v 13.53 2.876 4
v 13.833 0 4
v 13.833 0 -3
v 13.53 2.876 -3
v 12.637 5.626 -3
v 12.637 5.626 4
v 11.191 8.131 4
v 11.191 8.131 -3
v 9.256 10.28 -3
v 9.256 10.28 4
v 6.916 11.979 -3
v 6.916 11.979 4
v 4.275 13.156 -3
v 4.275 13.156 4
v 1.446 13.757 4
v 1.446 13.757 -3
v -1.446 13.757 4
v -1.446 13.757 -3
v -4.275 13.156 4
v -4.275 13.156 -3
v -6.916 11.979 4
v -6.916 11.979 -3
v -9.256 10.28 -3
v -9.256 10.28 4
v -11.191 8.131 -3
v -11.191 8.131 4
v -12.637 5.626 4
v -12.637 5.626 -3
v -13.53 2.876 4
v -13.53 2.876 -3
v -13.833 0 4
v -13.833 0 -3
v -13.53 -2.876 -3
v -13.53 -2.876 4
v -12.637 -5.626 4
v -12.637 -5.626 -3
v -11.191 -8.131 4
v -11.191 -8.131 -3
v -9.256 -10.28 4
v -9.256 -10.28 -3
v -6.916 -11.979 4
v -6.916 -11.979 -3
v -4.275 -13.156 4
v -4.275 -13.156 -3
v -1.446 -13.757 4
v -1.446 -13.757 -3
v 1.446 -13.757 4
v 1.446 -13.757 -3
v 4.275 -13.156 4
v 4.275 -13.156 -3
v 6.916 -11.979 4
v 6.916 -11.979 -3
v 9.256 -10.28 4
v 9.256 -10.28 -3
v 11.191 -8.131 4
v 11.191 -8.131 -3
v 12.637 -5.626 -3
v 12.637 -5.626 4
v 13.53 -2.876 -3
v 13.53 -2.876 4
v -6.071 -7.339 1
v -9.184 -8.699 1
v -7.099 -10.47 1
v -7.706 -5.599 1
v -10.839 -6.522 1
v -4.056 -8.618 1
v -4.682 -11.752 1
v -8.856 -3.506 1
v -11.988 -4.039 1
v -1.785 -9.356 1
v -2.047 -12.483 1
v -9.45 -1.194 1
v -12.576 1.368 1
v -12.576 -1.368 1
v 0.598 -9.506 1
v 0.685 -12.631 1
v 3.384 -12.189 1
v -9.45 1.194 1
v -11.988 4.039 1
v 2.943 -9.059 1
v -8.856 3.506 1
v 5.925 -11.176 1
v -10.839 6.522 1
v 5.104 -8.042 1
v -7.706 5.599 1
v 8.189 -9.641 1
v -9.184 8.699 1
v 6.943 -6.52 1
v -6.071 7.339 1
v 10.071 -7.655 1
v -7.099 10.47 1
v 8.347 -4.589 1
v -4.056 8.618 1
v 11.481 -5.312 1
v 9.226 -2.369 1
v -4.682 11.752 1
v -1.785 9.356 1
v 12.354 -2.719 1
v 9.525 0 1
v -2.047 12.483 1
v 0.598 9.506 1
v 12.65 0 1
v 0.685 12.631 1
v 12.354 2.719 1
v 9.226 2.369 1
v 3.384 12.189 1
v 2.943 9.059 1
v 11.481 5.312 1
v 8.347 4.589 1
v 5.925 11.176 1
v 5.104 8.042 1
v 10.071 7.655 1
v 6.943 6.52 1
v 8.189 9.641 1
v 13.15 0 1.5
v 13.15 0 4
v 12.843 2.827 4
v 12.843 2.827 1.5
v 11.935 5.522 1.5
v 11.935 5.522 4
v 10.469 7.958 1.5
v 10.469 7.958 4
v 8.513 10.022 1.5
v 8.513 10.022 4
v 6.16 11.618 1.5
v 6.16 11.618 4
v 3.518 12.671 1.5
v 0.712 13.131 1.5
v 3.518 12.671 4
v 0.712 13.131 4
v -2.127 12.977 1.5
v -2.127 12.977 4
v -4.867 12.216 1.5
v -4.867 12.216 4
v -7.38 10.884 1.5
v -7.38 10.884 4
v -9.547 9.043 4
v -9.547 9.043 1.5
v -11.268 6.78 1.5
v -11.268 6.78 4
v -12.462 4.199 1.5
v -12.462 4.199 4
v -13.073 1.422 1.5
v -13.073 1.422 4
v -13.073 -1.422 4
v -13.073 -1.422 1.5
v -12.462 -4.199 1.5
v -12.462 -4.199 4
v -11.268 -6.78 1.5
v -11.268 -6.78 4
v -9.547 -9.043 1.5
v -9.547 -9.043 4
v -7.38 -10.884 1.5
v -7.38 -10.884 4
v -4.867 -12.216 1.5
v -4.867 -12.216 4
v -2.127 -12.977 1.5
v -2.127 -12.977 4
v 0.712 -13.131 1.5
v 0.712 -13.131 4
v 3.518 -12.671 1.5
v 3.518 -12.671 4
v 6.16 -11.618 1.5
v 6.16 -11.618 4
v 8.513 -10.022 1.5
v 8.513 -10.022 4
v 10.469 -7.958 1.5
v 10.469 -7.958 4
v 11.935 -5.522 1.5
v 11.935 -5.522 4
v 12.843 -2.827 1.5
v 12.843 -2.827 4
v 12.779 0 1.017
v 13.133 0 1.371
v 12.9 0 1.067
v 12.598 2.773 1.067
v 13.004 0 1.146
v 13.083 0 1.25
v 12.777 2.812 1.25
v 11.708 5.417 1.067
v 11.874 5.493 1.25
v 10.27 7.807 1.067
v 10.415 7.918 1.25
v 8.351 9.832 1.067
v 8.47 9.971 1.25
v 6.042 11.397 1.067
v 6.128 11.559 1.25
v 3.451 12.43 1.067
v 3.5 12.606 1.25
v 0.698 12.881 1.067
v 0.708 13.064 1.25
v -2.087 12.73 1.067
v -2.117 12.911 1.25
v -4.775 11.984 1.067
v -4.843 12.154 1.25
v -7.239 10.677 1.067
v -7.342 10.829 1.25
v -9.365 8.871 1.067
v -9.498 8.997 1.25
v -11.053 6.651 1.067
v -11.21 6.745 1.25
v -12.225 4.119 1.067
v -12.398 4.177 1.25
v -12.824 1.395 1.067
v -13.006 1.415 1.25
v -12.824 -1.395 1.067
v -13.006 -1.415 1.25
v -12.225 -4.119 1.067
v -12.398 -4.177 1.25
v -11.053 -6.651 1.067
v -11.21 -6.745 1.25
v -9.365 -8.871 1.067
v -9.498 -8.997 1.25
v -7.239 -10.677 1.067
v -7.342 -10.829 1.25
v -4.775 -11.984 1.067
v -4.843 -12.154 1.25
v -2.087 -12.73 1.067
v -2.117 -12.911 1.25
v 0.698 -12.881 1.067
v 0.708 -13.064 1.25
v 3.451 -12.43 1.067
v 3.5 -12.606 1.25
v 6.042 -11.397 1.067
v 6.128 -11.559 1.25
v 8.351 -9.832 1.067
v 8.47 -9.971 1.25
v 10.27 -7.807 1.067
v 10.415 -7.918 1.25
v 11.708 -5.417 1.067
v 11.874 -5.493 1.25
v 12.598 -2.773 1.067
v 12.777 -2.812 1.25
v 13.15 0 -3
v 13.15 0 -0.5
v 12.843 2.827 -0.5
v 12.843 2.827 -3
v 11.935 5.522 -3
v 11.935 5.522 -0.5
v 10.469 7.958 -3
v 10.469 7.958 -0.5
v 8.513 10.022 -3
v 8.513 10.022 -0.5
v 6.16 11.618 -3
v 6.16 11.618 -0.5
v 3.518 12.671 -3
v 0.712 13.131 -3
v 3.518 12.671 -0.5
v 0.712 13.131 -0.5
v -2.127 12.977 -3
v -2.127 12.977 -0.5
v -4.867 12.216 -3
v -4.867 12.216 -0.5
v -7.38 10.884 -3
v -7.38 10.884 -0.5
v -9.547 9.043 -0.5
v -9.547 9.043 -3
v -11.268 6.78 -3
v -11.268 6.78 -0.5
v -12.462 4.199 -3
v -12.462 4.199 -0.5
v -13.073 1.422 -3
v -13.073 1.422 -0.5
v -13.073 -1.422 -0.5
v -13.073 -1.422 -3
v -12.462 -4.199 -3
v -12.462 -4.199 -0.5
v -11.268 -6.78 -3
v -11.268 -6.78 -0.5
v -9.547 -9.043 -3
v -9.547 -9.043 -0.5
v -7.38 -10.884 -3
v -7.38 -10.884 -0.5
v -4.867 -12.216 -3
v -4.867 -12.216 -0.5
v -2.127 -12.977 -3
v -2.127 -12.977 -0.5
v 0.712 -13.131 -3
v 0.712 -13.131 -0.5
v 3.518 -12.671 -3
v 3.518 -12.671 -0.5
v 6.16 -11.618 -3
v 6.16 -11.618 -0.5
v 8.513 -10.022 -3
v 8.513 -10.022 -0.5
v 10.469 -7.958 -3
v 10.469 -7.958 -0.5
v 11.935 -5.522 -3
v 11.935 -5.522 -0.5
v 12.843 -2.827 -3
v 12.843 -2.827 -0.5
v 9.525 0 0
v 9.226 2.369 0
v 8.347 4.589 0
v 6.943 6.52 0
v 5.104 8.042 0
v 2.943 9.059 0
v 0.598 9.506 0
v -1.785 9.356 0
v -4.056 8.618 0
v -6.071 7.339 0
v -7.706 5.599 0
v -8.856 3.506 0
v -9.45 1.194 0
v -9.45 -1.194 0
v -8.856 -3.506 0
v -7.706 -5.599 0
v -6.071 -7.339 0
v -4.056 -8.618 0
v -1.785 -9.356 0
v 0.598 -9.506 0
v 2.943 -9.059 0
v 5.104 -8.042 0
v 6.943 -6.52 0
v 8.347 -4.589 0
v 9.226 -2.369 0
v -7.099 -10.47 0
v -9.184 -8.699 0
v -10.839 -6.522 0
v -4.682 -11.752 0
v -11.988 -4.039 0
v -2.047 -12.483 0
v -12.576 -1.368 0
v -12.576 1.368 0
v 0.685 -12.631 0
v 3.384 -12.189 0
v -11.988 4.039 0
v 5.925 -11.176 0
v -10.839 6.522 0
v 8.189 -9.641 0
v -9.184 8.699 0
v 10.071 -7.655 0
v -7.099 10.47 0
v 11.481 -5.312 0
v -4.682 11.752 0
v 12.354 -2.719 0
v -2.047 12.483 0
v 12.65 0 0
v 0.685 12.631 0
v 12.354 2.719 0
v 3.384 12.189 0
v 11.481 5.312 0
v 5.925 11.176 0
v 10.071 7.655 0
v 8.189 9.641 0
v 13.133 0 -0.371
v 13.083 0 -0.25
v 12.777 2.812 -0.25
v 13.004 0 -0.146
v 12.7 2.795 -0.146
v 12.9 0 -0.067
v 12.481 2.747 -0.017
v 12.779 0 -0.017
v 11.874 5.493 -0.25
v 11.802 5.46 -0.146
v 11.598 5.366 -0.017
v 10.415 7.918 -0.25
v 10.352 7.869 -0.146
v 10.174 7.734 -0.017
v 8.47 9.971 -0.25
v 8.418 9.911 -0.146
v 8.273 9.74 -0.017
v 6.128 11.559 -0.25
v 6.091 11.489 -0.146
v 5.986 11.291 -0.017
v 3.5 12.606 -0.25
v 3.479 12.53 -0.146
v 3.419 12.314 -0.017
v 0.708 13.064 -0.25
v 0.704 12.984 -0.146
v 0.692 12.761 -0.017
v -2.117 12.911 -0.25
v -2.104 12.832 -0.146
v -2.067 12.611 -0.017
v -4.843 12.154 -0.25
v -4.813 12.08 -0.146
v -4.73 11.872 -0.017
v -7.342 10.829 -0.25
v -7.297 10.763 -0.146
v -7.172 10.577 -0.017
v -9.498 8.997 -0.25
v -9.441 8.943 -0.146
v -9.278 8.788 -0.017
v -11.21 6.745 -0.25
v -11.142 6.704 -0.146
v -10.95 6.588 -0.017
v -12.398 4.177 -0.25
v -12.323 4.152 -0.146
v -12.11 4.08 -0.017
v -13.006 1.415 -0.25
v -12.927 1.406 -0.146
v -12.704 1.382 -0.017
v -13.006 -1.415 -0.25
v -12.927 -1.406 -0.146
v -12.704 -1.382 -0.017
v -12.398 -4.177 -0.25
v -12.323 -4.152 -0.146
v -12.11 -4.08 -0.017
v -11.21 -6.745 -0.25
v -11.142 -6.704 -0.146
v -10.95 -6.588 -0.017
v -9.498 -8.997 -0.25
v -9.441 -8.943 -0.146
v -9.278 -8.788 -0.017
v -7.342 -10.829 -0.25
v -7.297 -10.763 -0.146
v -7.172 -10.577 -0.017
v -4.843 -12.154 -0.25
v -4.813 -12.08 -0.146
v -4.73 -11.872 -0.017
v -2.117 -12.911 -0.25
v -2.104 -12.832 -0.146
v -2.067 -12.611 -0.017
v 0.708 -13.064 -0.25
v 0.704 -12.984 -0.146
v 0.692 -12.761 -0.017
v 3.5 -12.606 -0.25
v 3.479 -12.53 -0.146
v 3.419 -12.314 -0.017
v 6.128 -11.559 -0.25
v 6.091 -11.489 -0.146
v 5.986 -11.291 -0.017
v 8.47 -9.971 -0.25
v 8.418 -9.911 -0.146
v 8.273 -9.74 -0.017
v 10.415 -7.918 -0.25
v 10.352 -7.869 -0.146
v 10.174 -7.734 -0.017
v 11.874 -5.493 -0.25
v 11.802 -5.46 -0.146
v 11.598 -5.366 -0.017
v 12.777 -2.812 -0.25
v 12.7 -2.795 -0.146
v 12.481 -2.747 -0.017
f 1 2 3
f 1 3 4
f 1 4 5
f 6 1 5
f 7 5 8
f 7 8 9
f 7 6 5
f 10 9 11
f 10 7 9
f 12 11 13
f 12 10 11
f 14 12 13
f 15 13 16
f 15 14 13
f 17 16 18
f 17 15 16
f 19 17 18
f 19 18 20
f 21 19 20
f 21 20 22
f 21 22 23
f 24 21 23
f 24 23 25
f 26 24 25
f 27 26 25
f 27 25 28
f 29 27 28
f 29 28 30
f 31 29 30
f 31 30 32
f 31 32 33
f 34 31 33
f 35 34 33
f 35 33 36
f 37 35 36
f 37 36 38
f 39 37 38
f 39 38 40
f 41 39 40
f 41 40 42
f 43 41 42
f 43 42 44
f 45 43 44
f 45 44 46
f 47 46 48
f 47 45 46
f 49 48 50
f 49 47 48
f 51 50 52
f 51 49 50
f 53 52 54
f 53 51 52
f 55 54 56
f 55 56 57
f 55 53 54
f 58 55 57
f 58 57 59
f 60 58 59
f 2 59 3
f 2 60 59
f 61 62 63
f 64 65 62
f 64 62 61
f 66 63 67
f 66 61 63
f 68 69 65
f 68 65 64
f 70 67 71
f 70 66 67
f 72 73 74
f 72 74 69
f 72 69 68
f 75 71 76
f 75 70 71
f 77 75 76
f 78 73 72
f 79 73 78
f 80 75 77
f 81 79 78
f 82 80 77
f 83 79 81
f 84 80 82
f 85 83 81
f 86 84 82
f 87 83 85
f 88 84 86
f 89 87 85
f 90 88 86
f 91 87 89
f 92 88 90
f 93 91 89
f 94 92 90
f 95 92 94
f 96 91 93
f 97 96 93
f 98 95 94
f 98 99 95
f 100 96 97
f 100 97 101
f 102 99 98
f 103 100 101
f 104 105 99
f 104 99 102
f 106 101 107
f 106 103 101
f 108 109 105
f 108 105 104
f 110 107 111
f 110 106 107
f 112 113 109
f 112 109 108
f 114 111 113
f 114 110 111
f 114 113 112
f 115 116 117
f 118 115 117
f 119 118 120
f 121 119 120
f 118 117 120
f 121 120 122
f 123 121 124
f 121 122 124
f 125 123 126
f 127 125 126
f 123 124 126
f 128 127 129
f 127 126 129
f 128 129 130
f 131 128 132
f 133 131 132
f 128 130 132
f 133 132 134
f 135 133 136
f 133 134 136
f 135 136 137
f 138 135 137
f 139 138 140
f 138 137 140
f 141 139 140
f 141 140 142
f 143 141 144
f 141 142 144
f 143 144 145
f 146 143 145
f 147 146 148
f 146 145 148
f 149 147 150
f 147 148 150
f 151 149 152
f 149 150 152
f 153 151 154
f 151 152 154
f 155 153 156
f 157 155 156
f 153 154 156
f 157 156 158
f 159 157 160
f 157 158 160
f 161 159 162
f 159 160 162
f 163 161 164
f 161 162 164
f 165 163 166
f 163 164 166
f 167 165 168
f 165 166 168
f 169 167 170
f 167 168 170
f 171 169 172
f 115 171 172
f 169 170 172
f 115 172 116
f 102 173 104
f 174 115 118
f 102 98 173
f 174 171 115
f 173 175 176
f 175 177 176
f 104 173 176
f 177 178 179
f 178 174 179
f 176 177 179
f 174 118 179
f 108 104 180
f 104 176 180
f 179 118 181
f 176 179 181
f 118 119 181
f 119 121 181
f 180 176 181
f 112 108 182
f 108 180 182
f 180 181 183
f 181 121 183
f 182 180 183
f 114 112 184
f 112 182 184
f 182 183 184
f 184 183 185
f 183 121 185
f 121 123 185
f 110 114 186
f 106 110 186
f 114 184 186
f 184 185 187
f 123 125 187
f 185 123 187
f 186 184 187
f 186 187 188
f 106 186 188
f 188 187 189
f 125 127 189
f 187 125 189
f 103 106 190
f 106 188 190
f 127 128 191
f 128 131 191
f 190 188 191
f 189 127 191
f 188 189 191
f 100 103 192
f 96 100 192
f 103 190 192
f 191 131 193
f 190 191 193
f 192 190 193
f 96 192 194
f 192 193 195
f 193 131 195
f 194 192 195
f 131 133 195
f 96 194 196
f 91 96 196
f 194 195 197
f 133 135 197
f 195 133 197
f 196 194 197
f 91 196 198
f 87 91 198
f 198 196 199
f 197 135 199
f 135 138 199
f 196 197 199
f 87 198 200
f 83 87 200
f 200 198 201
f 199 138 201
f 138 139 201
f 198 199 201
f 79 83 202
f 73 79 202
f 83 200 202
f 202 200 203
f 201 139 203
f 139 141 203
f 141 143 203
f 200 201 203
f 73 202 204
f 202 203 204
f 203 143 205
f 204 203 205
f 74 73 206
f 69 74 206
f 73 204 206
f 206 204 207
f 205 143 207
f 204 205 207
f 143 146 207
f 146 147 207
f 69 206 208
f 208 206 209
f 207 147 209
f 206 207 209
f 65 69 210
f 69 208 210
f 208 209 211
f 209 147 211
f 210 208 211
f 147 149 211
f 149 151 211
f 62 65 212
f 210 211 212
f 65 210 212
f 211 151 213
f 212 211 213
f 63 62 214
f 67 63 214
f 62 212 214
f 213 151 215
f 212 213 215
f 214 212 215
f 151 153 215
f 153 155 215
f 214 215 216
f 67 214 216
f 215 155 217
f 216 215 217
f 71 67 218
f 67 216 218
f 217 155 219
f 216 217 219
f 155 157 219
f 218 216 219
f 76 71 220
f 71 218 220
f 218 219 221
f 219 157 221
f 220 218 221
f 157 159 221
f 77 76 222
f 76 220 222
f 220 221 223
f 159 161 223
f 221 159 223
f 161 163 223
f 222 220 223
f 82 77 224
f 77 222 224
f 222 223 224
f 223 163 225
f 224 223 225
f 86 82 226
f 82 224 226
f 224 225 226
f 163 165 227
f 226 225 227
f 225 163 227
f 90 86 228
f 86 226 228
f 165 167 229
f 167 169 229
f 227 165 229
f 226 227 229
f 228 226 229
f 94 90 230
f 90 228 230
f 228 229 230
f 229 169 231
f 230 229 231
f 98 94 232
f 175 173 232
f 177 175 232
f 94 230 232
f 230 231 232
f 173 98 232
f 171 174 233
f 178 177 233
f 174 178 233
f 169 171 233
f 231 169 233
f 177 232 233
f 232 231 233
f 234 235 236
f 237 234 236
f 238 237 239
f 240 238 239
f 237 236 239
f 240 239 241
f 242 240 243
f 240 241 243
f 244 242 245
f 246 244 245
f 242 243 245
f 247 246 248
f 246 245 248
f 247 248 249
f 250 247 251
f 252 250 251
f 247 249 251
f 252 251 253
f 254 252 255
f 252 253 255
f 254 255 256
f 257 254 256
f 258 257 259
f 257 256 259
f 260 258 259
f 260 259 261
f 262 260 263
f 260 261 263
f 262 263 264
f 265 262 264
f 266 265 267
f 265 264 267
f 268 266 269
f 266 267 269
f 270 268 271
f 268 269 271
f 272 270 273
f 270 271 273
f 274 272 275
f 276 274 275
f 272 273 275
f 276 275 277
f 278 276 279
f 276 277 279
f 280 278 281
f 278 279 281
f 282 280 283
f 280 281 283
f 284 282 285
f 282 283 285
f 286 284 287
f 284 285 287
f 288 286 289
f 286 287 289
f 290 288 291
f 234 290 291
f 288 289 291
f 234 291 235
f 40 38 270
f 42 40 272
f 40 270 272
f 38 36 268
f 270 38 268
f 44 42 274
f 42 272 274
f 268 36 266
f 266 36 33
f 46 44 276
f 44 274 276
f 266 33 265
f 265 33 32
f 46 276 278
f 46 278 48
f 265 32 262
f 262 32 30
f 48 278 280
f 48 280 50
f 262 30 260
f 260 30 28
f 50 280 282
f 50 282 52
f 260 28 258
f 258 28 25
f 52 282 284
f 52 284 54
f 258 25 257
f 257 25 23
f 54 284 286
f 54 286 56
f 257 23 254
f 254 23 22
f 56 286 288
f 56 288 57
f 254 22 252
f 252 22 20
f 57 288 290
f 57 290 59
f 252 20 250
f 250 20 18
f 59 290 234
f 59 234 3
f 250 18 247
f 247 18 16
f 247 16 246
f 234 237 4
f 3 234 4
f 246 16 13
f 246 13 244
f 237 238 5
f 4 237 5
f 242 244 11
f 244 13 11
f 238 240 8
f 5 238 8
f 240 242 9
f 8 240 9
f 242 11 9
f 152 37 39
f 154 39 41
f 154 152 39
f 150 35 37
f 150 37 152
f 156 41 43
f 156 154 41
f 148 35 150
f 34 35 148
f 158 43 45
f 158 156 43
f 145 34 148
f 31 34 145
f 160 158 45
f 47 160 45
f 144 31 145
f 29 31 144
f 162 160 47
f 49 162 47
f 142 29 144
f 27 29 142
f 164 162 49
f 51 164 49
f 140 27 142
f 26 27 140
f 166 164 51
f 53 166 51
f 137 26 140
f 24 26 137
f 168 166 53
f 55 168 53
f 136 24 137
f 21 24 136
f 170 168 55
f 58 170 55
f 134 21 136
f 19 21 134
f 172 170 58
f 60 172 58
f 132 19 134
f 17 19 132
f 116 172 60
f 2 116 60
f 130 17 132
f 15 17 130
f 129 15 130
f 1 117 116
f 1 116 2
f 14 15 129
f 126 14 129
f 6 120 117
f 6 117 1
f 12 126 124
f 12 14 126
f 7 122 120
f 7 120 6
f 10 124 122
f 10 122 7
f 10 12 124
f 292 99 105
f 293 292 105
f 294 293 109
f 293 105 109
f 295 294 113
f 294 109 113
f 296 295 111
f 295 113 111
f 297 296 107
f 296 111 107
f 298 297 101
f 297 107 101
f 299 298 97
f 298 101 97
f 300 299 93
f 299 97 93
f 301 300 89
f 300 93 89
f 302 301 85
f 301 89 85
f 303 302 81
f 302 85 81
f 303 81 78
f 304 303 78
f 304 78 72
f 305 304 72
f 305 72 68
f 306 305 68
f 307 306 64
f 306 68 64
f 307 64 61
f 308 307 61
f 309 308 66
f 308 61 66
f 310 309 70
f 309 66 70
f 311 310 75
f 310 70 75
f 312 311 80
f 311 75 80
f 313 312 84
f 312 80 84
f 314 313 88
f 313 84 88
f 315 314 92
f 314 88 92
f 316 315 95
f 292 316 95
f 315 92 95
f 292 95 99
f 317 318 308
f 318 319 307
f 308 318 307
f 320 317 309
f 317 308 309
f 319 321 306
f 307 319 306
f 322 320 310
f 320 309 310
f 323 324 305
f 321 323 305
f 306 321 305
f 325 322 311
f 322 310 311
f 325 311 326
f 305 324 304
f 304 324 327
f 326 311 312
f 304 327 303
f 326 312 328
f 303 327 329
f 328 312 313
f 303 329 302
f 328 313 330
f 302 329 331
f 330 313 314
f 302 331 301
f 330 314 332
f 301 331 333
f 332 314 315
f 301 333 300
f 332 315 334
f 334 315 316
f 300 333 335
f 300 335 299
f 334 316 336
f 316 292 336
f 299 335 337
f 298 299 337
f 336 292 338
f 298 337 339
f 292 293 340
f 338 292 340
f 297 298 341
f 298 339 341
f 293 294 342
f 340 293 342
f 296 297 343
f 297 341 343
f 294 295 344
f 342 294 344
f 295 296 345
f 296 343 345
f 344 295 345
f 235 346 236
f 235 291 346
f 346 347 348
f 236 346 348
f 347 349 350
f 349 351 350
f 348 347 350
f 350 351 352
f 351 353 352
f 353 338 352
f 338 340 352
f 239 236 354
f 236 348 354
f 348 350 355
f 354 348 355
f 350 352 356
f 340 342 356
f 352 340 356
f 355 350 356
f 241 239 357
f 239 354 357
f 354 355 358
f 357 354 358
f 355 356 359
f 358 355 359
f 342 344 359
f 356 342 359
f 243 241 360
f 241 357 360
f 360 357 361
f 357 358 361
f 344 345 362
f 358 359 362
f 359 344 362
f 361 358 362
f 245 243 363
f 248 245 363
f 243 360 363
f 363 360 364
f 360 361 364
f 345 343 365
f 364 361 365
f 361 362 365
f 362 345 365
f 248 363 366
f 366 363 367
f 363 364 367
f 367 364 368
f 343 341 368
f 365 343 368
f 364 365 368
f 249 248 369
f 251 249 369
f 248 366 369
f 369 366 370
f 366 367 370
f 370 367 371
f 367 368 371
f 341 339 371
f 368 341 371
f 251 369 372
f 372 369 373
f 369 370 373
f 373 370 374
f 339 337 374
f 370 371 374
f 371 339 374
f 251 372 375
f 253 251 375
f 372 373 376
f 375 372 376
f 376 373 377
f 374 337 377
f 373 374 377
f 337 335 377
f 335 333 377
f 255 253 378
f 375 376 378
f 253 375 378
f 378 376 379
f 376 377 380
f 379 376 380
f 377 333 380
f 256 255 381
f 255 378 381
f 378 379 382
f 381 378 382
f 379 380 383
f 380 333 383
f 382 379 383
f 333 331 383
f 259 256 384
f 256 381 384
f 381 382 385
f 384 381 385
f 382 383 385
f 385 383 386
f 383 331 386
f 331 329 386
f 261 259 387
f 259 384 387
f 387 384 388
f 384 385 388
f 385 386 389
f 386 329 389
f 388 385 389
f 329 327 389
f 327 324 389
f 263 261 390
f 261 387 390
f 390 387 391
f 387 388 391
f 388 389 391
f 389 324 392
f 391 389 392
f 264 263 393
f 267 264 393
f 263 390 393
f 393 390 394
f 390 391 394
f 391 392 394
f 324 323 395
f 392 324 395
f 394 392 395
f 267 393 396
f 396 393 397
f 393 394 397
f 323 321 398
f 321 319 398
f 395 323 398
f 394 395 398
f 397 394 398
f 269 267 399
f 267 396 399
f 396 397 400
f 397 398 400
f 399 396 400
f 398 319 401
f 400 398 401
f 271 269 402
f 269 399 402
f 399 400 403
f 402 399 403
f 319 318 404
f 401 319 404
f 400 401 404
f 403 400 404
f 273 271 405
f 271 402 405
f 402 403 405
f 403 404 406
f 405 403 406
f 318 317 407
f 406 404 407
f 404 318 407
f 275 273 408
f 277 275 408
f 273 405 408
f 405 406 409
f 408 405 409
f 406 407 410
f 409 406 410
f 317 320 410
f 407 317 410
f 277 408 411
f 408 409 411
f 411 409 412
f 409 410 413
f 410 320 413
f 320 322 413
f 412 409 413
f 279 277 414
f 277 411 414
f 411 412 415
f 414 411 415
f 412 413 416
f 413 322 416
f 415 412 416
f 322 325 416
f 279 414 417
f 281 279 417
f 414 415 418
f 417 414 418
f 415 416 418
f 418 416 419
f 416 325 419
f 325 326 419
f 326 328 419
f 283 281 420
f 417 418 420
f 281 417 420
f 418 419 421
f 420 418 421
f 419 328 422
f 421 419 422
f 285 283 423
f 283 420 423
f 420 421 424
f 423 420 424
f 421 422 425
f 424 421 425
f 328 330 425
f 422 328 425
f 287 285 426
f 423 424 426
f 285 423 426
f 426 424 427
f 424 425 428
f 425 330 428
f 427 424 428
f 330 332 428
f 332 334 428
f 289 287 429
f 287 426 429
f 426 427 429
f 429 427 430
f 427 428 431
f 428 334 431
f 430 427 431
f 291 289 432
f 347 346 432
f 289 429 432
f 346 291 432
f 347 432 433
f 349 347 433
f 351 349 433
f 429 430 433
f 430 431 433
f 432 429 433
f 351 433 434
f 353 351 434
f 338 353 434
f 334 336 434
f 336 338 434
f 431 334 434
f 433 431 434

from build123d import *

# Parameters (mm, degrees)
SKETCH1_R           = 13.8327
SKETCH1_R_2         = 13.15
BOSS_EXTRUDE1_DEPTH = 3
BOSS_EXTRUDE2_START = 1
SKETCH2_R           = 13.8327
SKETCH2_R_2         = 9.525
BOSS_EXTRUDE2_DEPTH = 1
BOSS_EXTRUDE3_START = 3
SKETCH3_R           = 13.8327
SKETCH3_R_2         = 13.15
BOSS_EXTRUDE3_DEPTH = 3
FILLET1_R           = 0.5


with BuildPart() as part:
    # Sketch1 → Boss-Extrude1 (new body)
    with BuildSketch(Plane.XY):
        Circle(SKETCH1_R)
        Circle(SKETCH1_R_2, mode=Mode.SUBTRACT)
    extrude(amount=-BOSS_EXTRUDE1_DEPTH)

    # Sketch2 → Boss-Extrude2 (add)
    with BuildSketch(Plane.XY.offset(BOSS_EXTRUDE2_START)):
        Circle(SKETCH2_R)
        Circle(SKETCH2_R_2, mode=Mode.SUBTRACT)
    extrude(amount=-BOSS_EXTRUDE2_DEPTH)

    # Sketch3 → Boss-Extrude3 (add)
    with BuildSketch(Plane.XY.offset(1).offset(BOSS_EXTRUDE3_START)):
        Circle(SKETCH3_R)
        Circle(SKETCH3_R_2, mode=Mode.SUBTRACT)
    extrude(amount=-BOSS_EXTRUDE3_DEPTH)

    # Fillet1
    fillet1_edges = [part.edges().sort_by_distance(p)[0] for p in [
        (-13.15, 0, 0),
        (-13.15, 0, 1),
    ]]
    fillet(fillet1_edges, radius=FILLET1_R)


solid = part.part
